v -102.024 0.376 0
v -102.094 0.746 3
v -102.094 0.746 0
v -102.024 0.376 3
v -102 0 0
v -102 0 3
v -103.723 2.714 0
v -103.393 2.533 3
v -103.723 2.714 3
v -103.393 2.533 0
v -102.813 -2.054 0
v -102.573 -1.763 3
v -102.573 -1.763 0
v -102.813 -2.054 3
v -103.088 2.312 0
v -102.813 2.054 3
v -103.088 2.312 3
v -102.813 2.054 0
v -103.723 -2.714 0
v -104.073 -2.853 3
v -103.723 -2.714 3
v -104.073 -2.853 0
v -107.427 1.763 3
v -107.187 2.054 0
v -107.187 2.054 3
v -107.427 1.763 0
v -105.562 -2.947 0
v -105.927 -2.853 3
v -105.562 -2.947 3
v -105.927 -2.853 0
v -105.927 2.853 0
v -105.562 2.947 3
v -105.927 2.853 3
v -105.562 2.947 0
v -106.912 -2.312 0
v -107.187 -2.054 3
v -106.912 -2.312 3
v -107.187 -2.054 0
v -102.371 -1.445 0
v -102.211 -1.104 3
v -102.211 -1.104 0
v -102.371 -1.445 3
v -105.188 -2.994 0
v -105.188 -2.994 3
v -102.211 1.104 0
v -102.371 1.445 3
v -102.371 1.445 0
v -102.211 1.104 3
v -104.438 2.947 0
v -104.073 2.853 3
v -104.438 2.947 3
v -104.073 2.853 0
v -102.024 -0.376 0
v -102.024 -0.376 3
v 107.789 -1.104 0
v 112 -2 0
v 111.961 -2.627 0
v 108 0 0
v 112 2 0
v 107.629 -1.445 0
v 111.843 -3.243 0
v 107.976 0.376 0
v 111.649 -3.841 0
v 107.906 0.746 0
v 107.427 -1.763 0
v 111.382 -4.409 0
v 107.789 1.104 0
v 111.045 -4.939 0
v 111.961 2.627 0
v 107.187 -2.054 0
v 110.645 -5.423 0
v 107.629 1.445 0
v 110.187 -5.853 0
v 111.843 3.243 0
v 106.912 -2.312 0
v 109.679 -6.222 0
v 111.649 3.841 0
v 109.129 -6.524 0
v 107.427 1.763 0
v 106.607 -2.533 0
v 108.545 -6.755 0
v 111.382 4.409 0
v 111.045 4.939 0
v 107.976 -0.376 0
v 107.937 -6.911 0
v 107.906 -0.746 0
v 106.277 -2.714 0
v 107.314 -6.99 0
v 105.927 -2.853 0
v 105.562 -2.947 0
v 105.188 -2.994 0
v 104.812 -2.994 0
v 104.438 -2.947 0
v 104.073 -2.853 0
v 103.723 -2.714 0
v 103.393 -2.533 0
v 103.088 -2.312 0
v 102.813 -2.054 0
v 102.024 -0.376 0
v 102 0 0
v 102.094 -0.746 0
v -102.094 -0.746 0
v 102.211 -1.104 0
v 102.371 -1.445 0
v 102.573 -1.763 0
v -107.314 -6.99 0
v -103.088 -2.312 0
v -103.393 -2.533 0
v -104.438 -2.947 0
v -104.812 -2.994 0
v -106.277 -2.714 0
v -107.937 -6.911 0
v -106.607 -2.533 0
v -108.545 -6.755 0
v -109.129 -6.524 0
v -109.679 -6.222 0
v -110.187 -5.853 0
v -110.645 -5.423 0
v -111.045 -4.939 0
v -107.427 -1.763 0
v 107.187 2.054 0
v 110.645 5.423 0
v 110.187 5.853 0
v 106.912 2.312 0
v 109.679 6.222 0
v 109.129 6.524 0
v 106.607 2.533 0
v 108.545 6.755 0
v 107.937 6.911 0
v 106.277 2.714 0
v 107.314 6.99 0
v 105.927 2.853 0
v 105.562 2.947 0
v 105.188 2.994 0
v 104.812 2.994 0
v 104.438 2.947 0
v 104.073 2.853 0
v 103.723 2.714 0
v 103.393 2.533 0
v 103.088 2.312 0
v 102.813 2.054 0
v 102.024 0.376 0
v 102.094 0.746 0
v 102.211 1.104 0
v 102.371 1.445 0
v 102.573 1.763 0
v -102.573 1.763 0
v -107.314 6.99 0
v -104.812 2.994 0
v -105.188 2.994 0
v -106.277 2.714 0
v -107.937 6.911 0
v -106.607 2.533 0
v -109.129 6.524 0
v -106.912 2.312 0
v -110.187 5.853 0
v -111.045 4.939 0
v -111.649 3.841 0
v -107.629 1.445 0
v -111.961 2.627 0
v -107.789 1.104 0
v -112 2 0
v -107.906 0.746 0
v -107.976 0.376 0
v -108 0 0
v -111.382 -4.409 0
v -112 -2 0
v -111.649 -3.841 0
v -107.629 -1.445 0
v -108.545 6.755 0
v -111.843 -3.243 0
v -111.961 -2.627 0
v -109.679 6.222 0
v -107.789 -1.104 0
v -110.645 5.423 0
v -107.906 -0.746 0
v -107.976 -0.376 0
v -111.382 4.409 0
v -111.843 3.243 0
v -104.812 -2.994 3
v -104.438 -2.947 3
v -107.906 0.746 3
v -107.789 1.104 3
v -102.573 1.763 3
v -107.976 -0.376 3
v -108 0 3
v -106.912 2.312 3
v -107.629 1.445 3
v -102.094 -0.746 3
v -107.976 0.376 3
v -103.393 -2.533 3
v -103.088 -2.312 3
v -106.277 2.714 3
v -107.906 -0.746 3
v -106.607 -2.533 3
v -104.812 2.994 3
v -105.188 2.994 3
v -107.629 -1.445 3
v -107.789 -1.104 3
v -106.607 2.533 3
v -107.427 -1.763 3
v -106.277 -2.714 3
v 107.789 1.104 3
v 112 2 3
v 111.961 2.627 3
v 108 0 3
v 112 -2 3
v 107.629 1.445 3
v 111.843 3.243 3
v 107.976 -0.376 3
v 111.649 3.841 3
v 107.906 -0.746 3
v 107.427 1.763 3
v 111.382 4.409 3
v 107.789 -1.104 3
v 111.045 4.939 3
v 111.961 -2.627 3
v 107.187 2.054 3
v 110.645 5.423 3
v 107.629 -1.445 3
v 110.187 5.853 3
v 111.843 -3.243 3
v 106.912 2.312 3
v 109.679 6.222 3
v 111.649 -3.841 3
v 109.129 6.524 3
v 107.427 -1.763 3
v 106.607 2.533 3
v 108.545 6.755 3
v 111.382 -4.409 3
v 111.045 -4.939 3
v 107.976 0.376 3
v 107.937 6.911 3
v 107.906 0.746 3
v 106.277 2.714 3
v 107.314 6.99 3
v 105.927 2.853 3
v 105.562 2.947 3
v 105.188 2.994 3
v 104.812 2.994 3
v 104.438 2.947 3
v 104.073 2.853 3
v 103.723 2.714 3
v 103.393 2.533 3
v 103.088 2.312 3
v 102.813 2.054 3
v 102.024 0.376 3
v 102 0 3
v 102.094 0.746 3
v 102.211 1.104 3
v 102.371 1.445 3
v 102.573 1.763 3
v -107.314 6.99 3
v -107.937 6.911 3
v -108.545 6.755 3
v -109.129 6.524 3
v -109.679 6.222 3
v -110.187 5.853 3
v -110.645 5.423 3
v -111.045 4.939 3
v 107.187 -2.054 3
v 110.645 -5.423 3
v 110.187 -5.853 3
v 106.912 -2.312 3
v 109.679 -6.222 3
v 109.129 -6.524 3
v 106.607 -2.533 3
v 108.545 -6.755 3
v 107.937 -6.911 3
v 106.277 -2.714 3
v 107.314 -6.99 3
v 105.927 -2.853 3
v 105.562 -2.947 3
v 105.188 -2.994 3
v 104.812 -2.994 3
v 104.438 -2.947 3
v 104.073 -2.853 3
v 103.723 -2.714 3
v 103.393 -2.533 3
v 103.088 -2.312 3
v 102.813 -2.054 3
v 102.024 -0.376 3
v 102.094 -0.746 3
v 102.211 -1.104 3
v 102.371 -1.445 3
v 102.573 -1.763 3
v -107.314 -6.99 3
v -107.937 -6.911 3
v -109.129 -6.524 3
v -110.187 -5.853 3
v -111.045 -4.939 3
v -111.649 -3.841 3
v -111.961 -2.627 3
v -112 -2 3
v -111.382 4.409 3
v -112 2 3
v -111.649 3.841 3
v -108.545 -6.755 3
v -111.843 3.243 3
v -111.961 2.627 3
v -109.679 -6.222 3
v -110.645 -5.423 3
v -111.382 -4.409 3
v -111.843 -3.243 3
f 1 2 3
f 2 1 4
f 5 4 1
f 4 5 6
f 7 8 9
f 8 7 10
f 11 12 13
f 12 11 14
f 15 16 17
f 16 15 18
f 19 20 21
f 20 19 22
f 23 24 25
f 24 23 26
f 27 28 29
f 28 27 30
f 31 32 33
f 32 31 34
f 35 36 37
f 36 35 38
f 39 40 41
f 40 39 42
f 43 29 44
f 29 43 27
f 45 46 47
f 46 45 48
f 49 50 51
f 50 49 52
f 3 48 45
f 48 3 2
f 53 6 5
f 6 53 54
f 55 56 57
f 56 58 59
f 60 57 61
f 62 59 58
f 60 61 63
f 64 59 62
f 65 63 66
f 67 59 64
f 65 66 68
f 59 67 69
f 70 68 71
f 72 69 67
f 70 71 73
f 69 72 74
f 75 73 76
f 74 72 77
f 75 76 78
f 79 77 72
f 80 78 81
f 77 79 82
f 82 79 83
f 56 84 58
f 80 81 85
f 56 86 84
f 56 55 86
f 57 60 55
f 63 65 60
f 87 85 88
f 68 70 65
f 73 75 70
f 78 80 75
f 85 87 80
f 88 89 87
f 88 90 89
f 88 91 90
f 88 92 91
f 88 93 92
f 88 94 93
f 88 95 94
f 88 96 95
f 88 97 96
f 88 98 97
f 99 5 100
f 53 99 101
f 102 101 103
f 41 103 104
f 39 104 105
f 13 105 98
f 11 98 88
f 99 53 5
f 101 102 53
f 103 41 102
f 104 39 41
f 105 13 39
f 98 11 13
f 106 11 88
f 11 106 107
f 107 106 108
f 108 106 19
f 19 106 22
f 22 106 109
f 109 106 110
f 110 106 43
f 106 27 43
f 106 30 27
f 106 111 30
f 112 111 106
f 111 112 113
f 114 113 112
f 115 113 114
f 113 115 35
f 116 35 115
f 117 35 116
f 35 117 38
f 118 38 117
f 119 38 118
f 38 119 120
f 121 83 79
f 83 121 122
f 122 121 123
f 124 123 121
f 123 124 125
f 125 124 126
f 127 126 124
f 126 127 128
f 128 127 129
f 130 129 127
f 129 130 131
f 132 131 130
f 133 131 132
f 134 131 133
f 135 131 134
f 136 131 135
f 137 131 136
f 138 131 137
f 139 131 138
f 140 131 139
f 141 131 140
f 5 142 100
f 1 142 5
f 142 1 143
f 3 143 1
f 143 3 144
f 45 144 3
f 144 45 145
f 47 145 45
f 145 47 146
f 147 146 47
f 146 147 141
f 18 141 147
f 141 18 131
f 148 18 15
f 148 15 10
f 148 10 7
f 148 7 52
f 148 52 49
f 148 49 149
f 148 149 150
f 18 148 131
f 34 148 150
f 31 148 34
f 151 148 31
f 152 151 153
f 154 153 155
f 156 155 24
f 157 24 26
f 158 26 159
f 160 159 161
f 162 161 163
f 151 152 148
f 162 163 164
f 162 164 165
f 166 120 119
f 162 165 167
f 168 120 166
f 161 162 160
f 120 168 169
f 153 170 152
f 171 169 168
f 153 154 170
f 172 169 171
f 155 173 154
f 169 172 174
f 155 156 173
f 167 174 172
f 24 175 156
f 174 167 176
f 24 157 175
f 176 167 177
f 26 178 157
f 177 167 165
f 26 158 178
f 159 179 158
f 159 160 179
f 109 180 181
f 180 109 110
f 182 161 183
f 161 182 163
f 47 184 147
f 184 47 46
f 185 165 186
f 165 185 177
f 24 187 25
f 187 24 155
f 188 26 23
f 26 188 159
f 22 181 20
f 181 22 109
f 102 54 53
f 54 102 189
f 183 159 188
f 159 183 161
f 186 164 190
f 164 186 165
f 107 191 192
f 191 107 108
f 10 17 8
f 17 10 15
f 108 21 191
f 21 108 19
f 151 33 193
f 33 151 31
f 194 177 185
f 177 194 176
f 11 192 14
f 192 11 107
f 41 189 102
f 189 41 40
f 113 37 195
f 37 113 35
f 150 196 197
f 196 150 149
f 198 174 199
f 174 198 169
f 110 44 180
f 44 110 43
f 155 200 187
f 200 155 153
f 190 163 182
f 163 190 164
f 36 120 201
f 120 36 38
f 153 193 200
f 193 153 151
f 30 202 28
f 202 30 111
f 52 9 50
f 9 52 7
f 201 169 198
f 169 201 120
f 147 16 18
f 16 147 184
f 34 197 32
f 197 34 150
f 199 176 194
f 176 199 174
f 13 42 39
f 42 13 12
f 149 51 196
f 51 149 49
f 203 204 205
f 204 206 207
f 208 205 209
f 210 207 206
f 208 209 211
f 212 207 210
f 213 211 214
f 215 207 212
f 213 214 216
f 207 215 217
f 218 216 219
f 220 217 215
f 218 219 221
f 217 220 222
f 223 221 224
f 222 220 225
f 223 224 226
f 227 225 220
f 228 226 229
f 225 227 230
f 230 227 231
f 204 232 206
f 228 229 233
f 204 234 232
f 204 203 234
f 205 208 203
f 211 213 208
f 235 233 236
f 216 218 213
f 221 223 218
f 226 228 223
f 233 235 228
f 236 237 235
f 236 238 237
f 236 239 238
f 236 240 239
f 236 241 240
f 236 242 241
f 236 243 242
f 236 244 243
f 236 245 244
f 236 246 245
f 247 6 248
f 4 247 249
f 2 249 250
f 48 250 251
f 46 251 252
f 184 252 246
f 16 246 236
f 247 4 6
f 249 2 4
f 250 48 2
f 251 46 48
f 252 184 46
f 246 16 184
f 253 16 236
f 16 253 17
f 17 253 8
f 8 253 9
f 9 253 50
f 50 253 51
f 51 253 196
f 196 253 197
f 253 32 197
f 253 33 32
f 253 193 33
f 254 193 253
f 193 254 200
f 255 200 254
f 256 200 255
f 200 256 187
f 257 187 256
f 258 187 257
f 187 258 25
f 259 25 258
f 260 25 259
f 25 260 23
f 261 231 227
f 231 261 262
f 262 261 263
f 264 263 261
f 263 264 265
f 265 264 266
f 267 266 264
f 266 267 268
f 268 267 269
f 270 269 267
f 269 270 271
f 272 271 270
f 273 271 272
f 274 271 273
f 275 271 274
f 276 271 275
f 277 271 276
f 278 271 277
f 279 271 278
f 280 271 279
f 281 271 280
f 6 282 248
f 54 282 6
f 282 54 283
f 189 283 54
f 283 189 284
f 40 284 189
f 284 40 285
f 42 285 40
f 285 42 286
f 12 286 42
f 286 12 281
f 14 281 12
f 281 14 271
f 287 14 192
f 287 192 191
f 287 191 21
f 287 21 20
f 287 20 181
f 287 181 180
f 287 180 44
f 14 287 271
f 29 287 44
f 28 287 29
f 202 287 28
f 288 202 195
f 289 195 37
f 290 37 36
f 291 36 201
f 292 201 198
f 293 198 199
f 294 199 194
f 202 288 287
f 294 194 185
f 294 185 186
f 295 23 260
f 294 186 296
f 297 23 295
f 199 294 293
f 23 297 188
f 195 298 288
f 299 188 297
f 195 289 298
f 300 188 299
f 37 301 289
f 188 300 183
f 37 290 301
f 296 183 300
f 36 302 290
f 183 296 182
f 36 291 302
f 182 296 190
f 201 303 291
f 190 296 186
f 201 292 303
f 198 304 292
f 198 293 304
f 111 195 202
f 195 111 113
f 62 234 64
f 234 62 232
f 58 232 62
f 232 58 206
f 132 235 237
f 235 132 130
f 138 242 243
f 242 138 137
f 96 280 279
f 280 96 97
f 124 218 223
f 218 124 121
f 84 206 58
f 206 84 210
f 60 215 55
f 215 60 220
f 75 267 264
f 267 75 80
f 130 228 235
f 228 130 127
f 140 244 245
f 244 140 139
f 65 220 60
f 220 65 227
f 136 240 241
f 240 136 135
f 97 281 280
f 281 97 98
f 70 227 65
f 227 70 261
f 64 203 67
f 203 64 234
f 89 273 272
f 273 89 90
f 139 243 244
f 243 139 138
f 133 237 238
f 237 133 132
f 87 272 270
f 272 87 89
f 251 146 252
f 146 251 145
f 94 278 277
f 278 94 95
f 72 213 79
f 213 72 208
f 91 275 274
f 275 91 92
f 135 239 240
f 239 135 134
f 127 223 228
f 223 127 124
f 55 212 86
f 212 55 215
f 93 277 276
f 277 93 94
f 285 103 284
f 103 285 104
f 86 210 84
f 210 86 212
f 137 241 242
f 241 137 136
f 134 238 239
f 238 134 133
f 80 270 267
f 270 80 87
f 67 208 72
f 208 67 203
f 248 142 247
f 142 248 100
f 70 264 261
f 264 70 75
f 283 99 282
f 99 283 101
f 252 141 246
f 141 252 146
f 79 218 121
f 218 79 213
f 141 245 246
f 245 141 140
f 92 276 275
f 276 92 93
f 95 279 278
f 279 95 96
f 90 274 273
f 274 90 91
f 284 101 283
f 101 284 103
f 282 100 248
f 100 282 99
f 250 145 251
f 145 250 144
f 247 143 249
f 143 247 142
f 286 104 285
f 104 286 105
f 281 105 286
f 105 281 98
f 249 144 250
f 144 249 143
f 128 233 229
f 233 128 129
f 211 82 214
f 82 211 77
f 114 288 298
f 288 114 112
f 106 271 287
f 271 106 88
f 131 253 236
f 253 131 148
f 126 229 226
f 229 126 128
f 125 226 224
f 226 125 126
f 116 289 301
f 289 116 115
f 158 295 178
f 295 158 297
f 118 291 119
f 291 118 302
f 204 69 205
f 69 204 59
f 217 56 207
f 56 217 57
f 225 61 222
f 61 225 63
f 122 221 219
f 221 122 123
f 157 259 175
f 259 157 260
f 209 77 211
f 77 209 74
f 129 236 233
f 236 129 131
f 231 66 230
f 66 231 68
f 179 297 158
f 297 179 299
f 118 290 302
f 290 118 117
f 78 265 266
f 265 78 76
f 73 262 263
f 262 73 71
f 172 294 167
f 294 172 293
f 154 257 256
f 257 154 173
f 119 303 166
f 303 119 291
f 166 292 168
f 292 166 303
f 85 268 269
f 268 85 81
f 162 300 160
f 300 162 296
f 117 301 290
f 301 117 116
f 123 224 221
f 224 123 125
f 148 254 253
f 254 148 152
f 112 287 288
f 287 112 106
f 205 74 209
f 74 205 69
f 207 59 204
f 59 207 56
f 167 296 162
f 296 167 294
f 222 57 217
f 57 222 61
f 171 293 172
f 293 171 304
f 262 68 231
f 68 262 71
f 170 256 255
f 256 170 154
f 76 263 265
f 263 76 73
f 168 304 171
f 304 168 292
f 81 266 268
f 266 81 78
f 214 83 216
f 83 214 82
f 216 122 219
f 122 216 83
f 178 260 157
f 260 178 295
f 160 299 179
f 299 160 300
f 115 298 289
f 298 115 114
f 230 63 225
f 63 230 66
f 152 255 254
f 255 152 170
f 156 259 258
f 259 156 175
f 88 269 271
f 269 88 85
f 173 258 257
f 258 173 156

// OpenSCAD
$fn = 50;


difference() {
	union() {
		hull() {
			translate(v = [-107.0000000000, 2.0000000000, 0]) {
				cylinder(h = 3, r = 5);
			}
			translate(v = [107.0000000000, 2.0000000000, 0]) {
				cylinder(h = 3, r = 5);
			}
			translate(v = [-107.0000000000, -2.0000000000, 0]) {
				cylinder(h = 3, r = 5);
			}
			translate(v = [107.0000000000, -2.0000000000, 0]) {
				cylinder(h = 3, r = 5);
			}
		}
	}
	union() {
		translate(v = [-105.0000000000, 0.0000000000, 0]) {
			cylinder(h = 3, r = 3.0000000000);
		}
		translate(v = [105.0000000000, 0.0000000000, 0]) {
			cylinder(h = 3, r = 3.0000000000);
		}
		translate(v = [-105.0000000000, 0.0000000000, 0]) {
			cylinder(h = 3, r = 1.5000000000);
		}
		translate(v = [105.0000000000, 0.0000000000, 0]) {
			cylinder(h = 3, r = 1.5000000000);
		}
		translate(v = [-105.0000000000, 0.0000000000, 0]) {
			cylinder(h = 3, r = 1.5000000000);
		}
		translate(v = [105.0000000000, 0.0000000000, 0]) {
			cylinder(h = 3, r = 1.5000000000);
		}
		translate(v = [-105.0000000000, 0.0000000000, 0]) {
			cylinder(h = 3, r = 1.5000000000);
		}
		translate(v = [105.0000000000, 0.0000000000, 0]) {
			cylinder(h = 3, r = 1.5000000000);
		}
	}
}
